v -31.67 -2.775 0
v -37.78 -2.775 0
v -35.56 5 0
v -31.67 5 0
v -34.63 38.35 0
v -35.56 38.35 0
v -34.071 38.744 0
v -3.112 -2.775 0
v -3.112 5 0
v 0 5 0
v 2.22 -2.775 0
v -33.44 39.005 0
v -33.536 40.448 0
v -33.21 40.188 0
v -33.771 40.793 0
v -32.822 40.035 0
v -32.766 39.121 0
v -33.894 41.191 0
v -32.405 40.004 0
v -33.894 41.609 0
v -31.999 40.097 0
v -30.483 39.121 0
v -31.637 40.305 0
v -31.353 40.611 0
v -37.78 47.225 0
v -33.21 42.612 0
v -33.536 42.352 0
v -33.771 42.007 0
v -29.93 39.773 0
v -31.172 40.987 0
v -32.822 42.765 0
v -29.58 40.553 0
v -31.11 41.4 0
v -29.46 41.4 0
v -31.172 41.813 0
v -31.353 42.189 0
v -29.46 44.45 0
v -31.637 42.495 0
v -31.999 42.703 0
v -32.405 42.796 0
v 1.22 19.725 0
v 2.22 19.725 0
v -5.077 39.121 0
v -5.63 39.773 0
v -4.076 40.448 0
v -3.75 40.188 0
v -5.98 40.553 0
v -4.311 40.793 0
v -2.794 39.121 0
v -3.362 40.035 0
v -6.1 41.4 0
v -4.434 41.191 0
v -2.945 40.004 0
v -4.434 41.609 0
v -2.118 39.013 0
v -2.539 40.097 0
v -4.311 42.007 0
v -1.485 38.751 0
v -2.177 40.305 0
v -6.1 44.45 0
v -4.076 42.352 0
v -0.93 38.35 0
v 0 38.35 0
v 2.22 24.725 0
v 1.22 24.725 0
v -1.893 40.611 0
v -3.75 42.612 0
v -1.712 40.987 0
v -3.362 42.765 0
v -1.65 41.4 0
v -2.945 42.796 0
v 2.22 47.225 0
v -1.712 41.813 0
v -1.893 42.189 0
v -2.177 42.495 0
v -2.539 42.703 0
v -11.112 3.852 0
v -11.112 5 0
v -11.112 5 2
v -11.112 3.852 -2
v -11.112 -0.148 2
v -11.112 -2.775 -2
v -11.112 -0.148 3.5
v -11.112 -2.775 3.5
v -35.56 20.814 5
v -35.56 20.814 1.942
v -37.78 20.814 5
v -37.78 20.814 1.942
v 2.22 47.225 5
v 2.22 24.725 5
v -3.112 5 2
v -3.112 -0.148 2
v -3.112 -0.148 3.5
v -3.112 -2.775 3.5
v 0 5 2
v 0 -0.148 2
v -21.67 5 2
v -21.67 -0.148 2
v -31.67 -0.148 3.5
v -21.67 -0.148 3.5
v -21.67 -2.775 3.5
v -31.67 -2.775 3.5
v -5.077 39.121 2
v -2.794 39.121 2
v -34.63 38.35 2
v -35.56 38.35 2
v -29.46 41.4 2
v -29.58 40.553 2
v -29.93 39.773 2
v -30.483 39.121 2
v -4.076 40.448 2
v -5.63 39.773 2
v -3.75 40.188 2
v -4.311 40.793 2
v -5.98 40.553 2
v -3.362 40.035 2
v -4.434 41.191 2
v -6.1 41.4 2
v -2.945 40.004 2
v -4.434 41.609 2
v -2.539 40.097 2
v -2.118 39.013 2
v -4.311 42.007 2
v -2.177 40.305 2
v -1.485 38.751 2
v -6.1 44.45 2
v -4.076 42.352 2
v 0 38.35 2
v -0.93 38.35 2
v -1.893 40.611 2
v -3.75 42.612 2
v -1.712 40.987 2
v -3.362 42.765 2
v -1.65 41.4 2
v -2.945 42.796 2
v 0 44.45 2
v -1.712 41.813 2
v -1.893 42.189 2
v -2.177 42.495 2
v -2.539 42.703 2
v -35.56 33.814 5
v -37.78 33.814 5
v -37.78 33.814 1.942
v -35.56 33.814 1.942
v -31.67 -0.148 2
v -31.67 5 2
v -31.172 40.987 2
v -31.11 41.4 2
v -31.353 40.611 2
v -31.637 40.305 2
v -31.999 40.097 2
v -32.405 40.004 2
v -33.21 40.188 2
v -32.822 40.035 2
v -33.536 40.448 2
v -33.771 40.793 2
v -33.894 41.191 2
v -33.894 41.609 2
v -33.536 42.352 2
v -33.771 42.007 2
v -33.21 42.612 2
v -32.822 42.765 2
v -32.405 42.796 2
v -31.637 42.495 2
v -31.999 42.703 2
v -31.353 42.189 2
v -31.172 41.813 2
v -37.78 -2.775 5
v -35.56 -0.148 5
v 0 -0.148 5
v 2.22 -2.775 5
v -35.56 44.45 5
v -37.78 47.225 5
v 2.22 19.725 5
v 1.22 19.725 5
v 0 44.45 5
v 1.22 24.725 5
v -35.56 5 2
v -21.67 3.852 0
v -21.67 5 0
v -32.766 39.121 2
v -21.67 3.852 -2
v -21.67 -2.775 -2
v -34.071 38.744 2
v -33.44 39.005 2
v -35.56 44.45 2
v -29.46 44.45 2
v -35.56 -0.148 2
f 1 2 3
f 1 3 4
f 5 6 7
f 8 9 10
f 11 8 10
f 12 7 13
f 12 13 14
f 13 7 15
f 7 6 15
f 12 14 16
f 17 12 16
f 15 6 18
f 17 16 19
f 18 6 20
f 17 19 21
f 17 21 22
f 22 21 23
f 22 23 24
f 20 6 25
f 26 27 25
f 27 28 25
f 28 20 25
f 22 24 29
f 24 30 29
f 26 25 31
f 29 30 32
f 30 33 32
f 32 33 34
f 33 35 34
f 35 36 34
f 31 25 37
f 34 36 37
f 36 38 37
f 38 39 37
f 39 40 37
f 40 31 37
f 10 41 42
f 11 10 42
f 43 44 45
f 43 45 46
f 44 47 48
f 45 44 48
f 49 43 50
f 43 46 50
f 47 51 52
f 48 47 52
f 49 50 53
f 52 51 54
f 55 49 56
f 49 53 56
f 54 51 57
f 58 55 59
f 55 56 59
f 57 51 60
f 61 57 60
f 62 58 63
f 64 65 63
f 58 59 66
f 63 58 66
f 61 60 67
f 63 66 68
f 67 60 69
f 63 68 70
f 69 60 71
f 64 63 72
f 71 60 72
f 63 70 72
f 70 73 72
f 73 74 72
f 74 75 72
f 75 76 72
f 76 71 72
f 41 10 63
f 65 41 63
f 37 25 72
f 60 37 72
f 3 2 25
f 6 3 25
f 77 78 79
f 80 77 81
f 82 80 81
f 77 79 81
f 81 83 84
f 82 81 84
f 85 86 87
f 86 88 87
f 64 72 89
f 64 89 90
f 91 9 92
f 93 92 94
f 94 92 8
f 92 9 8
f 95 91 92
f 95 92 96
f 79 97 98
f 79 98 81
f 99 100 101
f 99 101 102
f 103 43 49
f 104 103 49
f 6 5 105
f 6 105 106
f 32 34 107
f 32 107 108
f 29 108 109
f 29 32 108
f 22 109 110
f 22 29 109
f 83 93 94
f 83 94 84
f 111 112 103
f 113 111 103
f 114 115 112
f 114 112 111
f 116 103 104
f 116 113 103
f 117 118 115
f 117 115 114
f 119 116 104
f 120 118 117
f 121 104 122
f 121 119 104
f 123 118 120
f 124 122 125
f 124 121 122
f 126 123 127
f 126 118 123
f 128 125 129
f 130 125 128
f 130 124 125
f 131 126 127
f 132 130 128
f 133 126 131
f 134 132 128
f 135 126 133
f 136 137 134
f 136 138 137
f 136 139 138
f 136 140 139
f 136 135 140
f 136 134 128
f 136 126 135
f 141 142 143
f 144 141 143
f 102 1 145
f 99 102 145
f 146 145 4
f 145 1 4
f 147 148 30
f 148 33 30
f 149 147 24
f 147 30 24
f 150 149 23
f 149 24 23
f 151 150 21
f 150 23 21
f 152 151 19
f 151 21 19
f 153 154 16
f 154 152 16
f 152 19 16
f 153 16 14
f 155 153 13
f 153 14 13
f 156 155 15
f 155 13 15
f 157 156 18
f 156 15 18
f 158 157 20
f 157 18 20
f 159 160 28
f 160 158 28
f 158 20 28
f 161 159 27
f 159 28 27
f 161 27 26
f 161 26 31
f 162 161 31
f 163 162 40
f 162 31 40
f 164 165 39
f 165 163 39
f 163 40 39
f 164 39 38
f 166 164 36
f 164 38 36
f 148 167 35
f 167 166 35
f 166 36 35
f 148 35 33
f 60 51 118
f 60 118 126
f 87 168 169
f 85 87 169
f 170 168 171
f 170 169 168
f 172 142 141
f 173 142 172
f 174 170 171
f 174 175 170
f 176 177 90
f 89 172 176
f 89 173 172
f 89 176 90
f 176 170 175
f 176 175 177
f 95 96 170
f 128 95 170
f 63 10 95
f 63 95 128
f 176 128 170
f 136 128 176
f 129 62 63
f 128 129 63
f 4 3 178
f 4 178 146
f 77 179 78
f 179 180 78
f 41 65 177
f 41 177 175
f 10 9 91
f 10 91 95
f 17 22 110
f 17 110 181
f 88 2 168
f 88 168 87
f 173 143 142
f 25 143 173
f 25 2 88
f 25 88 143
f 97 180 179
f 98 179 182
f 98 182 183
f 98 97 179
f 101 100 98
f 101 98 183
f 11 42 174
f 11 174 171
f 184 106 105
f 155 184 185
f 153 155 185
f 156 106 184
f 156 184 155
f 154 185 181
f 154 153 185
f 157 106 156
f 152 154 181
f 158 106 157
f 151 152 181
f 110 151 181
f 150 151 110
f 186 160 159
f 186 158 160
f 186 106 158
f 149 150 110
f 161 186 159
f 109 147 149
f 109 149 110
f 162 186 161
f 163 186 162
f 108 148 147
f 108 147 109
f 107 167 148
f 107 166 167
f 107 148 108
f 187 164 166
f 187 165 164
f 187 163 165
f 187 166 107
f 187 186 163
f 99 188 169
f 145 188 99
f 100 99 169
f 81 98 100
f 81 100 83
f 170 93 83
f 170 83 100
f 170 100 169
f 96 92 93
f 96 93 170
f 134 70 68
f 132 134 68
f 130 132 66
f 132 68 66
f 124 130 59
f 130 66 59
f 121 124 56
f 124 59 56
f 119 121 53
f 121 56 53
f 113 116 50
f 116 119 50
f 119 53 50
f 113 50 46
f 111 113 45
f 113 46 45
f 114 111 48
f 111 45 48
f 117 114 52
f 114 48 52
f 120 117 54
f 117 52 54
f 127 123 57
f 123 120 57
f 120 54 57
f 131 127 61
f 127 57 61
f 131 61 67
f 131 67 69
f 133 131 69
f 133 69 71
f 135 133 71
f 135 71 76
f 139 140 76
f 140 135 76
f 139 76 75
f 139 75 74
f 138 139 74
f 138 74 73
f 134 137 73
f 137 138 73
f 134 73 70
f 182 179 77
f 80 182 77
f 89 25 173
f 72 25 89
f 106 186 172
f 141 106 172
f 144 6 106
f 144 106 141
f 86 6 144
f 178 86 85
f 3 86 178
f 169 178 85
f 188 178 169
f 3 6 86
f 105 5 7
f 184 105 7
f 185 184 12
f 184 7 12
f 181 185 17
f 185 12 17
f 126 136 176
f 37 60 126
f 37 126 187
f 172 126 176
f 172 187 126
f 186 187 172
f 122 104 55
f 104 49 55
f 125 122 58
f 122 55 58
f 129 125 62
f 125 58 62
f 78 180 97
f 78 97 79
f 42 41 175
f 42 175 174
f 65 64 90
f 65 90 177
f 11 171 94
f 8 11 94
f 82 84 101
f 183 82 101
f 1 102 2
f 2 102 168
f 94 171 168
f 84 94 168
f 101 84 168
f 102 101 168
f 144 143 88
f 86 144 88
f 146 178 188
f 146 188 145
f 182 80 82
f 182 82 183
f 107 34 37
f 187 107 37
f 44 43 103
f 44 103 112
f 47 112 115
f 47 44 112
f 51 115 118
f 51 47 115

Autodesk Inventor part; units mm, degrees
ref_plane "YZ Plane" through (0, 0, 0) normal (1, 0, 0) x (0, 1, 0)
ref_plane "XZ Plane" through (0, 0, 0) normal (0, 1, 0) x (-1, 0, 0)
ref_plane "XY Plane" through (0, 0, 0) normal (0, 0, 1) x (1, 0, 0)
sketch "Sketch1" plane through (0, 0, 0) normal (0, 0, 1) x (1, 0, 0)
  line L0 (-35.56, 38.35) -> (-35.56, 5)
  line L1 (0, 5) -> (0, 38.35)
  line L2 (-37.78, 47.225) -> (2.22, 47.225)
  line L3 (2.22, -2.775) -> (-37.78, -2.775)
  line L4 (-37.78, -2.775) -> (-37.78, 47.225)
  line L5 (1.22, 24.725) -> (1.22, 19.725)
  line L6 (1.22, 19.725) -> (2.22, 19.725)
  line L7 (2.22, 24.725) -> (1.22, 24.725)
  line L8 (2.22, 47.225) -> (2.22, 24.725)
  line L9 (2.22, 19.725) -> (2.22, -2.775)
  circle A0 centre (-3.05, 41.4) radius 1.4
  circle A1 centre (-32.51, 41.4) radius 1.4
  arc A2 (-6.1, 41.4) -> (-3.05, 38.35) centre (-3.05, 41.4) ccw
  line L10 (-6.1, 41.4) -> (-6.1, 44.45)
  line L11 (-3.05, 38.35) -> (0, 38.35)
  arc A3 (-32.51, 38.35) -> (-29.46, 41.4) centre (-32.51, 41.4) ccw
  line L12 (-29.46, 41.4) -> (-29.46, 44.45)
  line L13 (-32.51, 38.35) -> (-35.56, 38.35)
  line L14 (-6.1, 44.45) -> (-29.46, 44.45)
  line L15 (-35.56, 5) -> (0, 5)
  line L16 (0, 38.35) -> (0, 44.45)
  line L17 (0, 44.45) -> (-6.1, 44.45)
  line L18 (-29.46, 44.45) -> (-35.56, 44.45)
  line L19 (-35.56, 44.45) -> (-35.56, 38.35)
  line L20 (0, 5) -> (-35.56, 5)
  line L21 (-35.56, 5) -> (-35.56, -0.1476)
  line L22 (-35.56, -0.1476) -> (0, -0.1476)
  line L23 (0, -0.1476) -> (0, 5)
  point P0 (-17.78, 22.225)
  dimension "d0" = 40
  dimension "d1" = 50
  dimension "d2" = 5
  dimension "d4" = 1
  dimension "d6" = 7.775
  dimension "d8" = 3.05
  dimension "d9" = 2.8
extrude "Extrusion1" add sketch "Sketch1" along normal blind 5 contours L2 L8 L7 L5 L6 L9 L3 L4
ref_plane "Work Plane1" through (0, 0, 0) normal (0, 0, 1) x (1, 0, 0)
sketch "Sketch2" plane through (0, 0, 0) normal (0, 0, 1) x (1, 0, 0)
  line L0 (-35.56, 38.35) -> (-35.56, 5)
  line L1 (0, 5) -> (0, 38.35)
  line L2 (-37.78, 47.225) -> (2.22, 47.225)
  line L3 (2.22, -2.775) -> (-37.78, -2.775)
  line L4 (-37.78, -2.775) -> (-37.78, 47.225)
  line L5 (1.22, 24.725) -> (1.22, 19.725)
  line L6 (1.22, 19.725) -> (2.22, 19.725)
  line L7 (2.22, 24.725) -> (1.22, 24.725)
  line L8 (2.22, 47.225) -> (2.22, 24.725)
  line L9 (2.22, 19.725) -> (2.22, -2.775)
  circle A0 centre (-3.05, 41.4) radius 1.4
  circle A1 centre (-32.51, 41.4) radius 1.4
  arc A2 (-6.1, 41.4) -> (-3.05, 38.35) centre (-3.05, 41.4) ccw
  line L10 (-6.1, 41.4) -> (-6.1, 44.45)
  line L11 (-3.05, 38.35) -> (0, 38.35)
  arc A3 (-32.51, 38.35) -> (-29.46, 41.4) centre (-32.51, 41.4) ccw
  line L12 (-29.46, 41.4) -> (-29.46, 44.45)
  line L13 (-32.51, 38.35) -> (-35.56, 38.35)
  line L14 (-6.1, 44.45) -> (-29.46, 44.45)
  line L15 (-35.56, 5) -> (0, 5)
  line L16 (0, 38.35) -> (0, 44.45)
  line L17 (0, 44.45) -> (-6.1, 44.45)
  line L18 (-29.46, 44.45) -> (-35.56, 44.45)
  line L19 (-35.56, 44.45) -> (-35.56, 38.35)
  line L20 (0, 5) -> (-35.56, 5)
  line L21 (-35.56, 5) -> (-35.56, -0.2)
  line L22 (-35.56, -0.2) -> (0, -0.2)
  line L23 (0, -0.2) -> (0, 5)
  line L24 (-35.56, -0.1476) -> (0, -0.1476) projected
  point P0 (0, 0)
  point P1 (-17.78, 22.225)
  dimension "d12" = 40
  dimension "d13" = 50
  dimension "d14" = 5
  dimension "d15" = 1
  dimension "d16" = 7.775
  dimension "d17" = 3.05
  dimension "d18" = 2.8
  dimension "d27" = 5.2
extrude "Extrusion2" add sketch "Sketch2" along normal blind 2 contours L19 L18 L12 A3 L13 | L15 L23 L24 L21 | L24 L23 L22 L21 | L11 A2 L10 L17 L16
sketch "Sketch3" plane through (-37.78, -2.775, 0) normal (-1, 0, 0) x (0, 0, 1)
  line L0 (5.9421, 36.5891) -> (1.9421, 36.5891)
  line L1 (1.9421, 36.5891) -> (1.9421, 23.5891)
  line L2 (1.9421, 23.5891) -> (5.9421, 23.5891)
  line L3 (5.9421, 23.5891) -> (5.9421, 36.5891)
  point P0 (0, 2.775)
  dimension "d21" = 4
  dimension "d22" = 13
extrude "Extrusion3" cut sketch "Sketch3" against normal up to surface (2.22 mm away)
sketch "Sketch4" plane through (0, 0, 0) normal (0, 0, -1) x (-1, 0, 0)
  line L0 (9.525, 39.121) -> (2.794, 39.121) projected
  line L1 (2.794, 39.121) -> (2.0566, 39.0072) projected
  line L2 (2.0566, 39.0072) -> (1.3738, 38.7064) projected
  arc A0 (29.46, 41.4) -> (32.51, 38.35) centre (32.51, 41.4) ccw projected
  line L3 (30.483, 39.121) -> (32.766, 39.121)
  line L4 (35.56, 38.35) -> (32.51, 38.35) projected
  arc A1 (34.63, 38.35) -> (32.766, 39.121) centre (32.5832, 36.0404) ccw
  line L5 (34.63, 38.35) -> (32.51, 38.35)
  arc A2 (30.483, 39.121) -> (32.51, 38.35) centre (32.51, 41.4) ccw
  arc A3 (3.05, 38.35) -> (6.1, 41.4) centre (3.05, 41.4) ccw projected
  arc A4 (3.05, 38.35) -> (5.1075, 39.121) centre (3.078, 41.4062) ccw
  arc A5 (2.794, 39.121) -> (0.93, 38.35) centre (2.917, 36.1849) ccw
  line L6 (5.1075, 39.121) -> (2.794, 39.121)
  line L7 (3.05, 38.35) -> (0.93, 38.35)
  point P0 (0, 0)
extrude "Extrusion4" cut sketch "Sketch4" against normal blind 2 contours A4 A3 L0 | A3 L7 A5 L2 L1 L0 | L1 A5 | A5 L2 | L3 A1 L4 A0
sketch "Sketch5" plane through (0, 0, 0) normal (0, 0, -1) x (-1, 0, 0)
  line L0 (26.712, -2.7097) -> (26.628, -2.7097)
  line L1 (0, 5) -> (35.56, 5) projected
  line L2 (4.162, 5) -> (10.062, 5)
  line L3 (31.67, -2.775) -> (31.67, 5)
  line L4 (31.67, 5) -> (21.67, 5)
  line L5 (21.67, 5) -> (21.67, -2.775)
  line L6 (11.112, -2.775) -> (11.112, 5)
  line L7 (11.112, 5) -> (3.112, 5)
  line L8 (3.112, 5) -> (3.112, -2.775)
  line L9 (31.67, -2.775) -> (21.67, -2.775)
  line L10 (-2.22, -2.775) -> (37.78, -2.775) projected
  line L11 (11.112, -2.775) -> (3.112, -2.775)
  point P0 (0, 0)
  point P1 (26.67, -2.775)
  point P2 (7.112, -2.775)
extrude "Extrusion5" cut sketch "Sketch5" against normal blind 3.5 contours L1 L6 L10 L8 | L5 L1 L3 L9
sketch "Sketch6" plane through (0, 0, 0) normal (0, 0, -1) x (-1, 0, 0)
  line L0 (45.4266, 18.5636) -> (67.4266, 18.5636) projected
  line L1 (45.4266, -1.4364) -> (45.4266, 18.5636) projected
  line L2 (21.67, 3.8524) -> (21.67, -0.1476)
  line L3 (11.112, 3.8524) -> (11.112, -2.775)
  line L4 (11.112, -2.775) -> (21.67, -2.775)
  line L5 (21.67, -2.775) -> (21.67, 3.8524)
  line L6 (21.67, 3.8524) -> (11.112, 3.8524)
  line L7 (21.67, -2.775) -> (21.67, 5) projected
  point P0 (0, 0)
  dimension "d37" = 22
  dimension "d38" = 20
extrude "Extrusion6" add sketch "Sketch6" along normal blind 2 from surface at 0
